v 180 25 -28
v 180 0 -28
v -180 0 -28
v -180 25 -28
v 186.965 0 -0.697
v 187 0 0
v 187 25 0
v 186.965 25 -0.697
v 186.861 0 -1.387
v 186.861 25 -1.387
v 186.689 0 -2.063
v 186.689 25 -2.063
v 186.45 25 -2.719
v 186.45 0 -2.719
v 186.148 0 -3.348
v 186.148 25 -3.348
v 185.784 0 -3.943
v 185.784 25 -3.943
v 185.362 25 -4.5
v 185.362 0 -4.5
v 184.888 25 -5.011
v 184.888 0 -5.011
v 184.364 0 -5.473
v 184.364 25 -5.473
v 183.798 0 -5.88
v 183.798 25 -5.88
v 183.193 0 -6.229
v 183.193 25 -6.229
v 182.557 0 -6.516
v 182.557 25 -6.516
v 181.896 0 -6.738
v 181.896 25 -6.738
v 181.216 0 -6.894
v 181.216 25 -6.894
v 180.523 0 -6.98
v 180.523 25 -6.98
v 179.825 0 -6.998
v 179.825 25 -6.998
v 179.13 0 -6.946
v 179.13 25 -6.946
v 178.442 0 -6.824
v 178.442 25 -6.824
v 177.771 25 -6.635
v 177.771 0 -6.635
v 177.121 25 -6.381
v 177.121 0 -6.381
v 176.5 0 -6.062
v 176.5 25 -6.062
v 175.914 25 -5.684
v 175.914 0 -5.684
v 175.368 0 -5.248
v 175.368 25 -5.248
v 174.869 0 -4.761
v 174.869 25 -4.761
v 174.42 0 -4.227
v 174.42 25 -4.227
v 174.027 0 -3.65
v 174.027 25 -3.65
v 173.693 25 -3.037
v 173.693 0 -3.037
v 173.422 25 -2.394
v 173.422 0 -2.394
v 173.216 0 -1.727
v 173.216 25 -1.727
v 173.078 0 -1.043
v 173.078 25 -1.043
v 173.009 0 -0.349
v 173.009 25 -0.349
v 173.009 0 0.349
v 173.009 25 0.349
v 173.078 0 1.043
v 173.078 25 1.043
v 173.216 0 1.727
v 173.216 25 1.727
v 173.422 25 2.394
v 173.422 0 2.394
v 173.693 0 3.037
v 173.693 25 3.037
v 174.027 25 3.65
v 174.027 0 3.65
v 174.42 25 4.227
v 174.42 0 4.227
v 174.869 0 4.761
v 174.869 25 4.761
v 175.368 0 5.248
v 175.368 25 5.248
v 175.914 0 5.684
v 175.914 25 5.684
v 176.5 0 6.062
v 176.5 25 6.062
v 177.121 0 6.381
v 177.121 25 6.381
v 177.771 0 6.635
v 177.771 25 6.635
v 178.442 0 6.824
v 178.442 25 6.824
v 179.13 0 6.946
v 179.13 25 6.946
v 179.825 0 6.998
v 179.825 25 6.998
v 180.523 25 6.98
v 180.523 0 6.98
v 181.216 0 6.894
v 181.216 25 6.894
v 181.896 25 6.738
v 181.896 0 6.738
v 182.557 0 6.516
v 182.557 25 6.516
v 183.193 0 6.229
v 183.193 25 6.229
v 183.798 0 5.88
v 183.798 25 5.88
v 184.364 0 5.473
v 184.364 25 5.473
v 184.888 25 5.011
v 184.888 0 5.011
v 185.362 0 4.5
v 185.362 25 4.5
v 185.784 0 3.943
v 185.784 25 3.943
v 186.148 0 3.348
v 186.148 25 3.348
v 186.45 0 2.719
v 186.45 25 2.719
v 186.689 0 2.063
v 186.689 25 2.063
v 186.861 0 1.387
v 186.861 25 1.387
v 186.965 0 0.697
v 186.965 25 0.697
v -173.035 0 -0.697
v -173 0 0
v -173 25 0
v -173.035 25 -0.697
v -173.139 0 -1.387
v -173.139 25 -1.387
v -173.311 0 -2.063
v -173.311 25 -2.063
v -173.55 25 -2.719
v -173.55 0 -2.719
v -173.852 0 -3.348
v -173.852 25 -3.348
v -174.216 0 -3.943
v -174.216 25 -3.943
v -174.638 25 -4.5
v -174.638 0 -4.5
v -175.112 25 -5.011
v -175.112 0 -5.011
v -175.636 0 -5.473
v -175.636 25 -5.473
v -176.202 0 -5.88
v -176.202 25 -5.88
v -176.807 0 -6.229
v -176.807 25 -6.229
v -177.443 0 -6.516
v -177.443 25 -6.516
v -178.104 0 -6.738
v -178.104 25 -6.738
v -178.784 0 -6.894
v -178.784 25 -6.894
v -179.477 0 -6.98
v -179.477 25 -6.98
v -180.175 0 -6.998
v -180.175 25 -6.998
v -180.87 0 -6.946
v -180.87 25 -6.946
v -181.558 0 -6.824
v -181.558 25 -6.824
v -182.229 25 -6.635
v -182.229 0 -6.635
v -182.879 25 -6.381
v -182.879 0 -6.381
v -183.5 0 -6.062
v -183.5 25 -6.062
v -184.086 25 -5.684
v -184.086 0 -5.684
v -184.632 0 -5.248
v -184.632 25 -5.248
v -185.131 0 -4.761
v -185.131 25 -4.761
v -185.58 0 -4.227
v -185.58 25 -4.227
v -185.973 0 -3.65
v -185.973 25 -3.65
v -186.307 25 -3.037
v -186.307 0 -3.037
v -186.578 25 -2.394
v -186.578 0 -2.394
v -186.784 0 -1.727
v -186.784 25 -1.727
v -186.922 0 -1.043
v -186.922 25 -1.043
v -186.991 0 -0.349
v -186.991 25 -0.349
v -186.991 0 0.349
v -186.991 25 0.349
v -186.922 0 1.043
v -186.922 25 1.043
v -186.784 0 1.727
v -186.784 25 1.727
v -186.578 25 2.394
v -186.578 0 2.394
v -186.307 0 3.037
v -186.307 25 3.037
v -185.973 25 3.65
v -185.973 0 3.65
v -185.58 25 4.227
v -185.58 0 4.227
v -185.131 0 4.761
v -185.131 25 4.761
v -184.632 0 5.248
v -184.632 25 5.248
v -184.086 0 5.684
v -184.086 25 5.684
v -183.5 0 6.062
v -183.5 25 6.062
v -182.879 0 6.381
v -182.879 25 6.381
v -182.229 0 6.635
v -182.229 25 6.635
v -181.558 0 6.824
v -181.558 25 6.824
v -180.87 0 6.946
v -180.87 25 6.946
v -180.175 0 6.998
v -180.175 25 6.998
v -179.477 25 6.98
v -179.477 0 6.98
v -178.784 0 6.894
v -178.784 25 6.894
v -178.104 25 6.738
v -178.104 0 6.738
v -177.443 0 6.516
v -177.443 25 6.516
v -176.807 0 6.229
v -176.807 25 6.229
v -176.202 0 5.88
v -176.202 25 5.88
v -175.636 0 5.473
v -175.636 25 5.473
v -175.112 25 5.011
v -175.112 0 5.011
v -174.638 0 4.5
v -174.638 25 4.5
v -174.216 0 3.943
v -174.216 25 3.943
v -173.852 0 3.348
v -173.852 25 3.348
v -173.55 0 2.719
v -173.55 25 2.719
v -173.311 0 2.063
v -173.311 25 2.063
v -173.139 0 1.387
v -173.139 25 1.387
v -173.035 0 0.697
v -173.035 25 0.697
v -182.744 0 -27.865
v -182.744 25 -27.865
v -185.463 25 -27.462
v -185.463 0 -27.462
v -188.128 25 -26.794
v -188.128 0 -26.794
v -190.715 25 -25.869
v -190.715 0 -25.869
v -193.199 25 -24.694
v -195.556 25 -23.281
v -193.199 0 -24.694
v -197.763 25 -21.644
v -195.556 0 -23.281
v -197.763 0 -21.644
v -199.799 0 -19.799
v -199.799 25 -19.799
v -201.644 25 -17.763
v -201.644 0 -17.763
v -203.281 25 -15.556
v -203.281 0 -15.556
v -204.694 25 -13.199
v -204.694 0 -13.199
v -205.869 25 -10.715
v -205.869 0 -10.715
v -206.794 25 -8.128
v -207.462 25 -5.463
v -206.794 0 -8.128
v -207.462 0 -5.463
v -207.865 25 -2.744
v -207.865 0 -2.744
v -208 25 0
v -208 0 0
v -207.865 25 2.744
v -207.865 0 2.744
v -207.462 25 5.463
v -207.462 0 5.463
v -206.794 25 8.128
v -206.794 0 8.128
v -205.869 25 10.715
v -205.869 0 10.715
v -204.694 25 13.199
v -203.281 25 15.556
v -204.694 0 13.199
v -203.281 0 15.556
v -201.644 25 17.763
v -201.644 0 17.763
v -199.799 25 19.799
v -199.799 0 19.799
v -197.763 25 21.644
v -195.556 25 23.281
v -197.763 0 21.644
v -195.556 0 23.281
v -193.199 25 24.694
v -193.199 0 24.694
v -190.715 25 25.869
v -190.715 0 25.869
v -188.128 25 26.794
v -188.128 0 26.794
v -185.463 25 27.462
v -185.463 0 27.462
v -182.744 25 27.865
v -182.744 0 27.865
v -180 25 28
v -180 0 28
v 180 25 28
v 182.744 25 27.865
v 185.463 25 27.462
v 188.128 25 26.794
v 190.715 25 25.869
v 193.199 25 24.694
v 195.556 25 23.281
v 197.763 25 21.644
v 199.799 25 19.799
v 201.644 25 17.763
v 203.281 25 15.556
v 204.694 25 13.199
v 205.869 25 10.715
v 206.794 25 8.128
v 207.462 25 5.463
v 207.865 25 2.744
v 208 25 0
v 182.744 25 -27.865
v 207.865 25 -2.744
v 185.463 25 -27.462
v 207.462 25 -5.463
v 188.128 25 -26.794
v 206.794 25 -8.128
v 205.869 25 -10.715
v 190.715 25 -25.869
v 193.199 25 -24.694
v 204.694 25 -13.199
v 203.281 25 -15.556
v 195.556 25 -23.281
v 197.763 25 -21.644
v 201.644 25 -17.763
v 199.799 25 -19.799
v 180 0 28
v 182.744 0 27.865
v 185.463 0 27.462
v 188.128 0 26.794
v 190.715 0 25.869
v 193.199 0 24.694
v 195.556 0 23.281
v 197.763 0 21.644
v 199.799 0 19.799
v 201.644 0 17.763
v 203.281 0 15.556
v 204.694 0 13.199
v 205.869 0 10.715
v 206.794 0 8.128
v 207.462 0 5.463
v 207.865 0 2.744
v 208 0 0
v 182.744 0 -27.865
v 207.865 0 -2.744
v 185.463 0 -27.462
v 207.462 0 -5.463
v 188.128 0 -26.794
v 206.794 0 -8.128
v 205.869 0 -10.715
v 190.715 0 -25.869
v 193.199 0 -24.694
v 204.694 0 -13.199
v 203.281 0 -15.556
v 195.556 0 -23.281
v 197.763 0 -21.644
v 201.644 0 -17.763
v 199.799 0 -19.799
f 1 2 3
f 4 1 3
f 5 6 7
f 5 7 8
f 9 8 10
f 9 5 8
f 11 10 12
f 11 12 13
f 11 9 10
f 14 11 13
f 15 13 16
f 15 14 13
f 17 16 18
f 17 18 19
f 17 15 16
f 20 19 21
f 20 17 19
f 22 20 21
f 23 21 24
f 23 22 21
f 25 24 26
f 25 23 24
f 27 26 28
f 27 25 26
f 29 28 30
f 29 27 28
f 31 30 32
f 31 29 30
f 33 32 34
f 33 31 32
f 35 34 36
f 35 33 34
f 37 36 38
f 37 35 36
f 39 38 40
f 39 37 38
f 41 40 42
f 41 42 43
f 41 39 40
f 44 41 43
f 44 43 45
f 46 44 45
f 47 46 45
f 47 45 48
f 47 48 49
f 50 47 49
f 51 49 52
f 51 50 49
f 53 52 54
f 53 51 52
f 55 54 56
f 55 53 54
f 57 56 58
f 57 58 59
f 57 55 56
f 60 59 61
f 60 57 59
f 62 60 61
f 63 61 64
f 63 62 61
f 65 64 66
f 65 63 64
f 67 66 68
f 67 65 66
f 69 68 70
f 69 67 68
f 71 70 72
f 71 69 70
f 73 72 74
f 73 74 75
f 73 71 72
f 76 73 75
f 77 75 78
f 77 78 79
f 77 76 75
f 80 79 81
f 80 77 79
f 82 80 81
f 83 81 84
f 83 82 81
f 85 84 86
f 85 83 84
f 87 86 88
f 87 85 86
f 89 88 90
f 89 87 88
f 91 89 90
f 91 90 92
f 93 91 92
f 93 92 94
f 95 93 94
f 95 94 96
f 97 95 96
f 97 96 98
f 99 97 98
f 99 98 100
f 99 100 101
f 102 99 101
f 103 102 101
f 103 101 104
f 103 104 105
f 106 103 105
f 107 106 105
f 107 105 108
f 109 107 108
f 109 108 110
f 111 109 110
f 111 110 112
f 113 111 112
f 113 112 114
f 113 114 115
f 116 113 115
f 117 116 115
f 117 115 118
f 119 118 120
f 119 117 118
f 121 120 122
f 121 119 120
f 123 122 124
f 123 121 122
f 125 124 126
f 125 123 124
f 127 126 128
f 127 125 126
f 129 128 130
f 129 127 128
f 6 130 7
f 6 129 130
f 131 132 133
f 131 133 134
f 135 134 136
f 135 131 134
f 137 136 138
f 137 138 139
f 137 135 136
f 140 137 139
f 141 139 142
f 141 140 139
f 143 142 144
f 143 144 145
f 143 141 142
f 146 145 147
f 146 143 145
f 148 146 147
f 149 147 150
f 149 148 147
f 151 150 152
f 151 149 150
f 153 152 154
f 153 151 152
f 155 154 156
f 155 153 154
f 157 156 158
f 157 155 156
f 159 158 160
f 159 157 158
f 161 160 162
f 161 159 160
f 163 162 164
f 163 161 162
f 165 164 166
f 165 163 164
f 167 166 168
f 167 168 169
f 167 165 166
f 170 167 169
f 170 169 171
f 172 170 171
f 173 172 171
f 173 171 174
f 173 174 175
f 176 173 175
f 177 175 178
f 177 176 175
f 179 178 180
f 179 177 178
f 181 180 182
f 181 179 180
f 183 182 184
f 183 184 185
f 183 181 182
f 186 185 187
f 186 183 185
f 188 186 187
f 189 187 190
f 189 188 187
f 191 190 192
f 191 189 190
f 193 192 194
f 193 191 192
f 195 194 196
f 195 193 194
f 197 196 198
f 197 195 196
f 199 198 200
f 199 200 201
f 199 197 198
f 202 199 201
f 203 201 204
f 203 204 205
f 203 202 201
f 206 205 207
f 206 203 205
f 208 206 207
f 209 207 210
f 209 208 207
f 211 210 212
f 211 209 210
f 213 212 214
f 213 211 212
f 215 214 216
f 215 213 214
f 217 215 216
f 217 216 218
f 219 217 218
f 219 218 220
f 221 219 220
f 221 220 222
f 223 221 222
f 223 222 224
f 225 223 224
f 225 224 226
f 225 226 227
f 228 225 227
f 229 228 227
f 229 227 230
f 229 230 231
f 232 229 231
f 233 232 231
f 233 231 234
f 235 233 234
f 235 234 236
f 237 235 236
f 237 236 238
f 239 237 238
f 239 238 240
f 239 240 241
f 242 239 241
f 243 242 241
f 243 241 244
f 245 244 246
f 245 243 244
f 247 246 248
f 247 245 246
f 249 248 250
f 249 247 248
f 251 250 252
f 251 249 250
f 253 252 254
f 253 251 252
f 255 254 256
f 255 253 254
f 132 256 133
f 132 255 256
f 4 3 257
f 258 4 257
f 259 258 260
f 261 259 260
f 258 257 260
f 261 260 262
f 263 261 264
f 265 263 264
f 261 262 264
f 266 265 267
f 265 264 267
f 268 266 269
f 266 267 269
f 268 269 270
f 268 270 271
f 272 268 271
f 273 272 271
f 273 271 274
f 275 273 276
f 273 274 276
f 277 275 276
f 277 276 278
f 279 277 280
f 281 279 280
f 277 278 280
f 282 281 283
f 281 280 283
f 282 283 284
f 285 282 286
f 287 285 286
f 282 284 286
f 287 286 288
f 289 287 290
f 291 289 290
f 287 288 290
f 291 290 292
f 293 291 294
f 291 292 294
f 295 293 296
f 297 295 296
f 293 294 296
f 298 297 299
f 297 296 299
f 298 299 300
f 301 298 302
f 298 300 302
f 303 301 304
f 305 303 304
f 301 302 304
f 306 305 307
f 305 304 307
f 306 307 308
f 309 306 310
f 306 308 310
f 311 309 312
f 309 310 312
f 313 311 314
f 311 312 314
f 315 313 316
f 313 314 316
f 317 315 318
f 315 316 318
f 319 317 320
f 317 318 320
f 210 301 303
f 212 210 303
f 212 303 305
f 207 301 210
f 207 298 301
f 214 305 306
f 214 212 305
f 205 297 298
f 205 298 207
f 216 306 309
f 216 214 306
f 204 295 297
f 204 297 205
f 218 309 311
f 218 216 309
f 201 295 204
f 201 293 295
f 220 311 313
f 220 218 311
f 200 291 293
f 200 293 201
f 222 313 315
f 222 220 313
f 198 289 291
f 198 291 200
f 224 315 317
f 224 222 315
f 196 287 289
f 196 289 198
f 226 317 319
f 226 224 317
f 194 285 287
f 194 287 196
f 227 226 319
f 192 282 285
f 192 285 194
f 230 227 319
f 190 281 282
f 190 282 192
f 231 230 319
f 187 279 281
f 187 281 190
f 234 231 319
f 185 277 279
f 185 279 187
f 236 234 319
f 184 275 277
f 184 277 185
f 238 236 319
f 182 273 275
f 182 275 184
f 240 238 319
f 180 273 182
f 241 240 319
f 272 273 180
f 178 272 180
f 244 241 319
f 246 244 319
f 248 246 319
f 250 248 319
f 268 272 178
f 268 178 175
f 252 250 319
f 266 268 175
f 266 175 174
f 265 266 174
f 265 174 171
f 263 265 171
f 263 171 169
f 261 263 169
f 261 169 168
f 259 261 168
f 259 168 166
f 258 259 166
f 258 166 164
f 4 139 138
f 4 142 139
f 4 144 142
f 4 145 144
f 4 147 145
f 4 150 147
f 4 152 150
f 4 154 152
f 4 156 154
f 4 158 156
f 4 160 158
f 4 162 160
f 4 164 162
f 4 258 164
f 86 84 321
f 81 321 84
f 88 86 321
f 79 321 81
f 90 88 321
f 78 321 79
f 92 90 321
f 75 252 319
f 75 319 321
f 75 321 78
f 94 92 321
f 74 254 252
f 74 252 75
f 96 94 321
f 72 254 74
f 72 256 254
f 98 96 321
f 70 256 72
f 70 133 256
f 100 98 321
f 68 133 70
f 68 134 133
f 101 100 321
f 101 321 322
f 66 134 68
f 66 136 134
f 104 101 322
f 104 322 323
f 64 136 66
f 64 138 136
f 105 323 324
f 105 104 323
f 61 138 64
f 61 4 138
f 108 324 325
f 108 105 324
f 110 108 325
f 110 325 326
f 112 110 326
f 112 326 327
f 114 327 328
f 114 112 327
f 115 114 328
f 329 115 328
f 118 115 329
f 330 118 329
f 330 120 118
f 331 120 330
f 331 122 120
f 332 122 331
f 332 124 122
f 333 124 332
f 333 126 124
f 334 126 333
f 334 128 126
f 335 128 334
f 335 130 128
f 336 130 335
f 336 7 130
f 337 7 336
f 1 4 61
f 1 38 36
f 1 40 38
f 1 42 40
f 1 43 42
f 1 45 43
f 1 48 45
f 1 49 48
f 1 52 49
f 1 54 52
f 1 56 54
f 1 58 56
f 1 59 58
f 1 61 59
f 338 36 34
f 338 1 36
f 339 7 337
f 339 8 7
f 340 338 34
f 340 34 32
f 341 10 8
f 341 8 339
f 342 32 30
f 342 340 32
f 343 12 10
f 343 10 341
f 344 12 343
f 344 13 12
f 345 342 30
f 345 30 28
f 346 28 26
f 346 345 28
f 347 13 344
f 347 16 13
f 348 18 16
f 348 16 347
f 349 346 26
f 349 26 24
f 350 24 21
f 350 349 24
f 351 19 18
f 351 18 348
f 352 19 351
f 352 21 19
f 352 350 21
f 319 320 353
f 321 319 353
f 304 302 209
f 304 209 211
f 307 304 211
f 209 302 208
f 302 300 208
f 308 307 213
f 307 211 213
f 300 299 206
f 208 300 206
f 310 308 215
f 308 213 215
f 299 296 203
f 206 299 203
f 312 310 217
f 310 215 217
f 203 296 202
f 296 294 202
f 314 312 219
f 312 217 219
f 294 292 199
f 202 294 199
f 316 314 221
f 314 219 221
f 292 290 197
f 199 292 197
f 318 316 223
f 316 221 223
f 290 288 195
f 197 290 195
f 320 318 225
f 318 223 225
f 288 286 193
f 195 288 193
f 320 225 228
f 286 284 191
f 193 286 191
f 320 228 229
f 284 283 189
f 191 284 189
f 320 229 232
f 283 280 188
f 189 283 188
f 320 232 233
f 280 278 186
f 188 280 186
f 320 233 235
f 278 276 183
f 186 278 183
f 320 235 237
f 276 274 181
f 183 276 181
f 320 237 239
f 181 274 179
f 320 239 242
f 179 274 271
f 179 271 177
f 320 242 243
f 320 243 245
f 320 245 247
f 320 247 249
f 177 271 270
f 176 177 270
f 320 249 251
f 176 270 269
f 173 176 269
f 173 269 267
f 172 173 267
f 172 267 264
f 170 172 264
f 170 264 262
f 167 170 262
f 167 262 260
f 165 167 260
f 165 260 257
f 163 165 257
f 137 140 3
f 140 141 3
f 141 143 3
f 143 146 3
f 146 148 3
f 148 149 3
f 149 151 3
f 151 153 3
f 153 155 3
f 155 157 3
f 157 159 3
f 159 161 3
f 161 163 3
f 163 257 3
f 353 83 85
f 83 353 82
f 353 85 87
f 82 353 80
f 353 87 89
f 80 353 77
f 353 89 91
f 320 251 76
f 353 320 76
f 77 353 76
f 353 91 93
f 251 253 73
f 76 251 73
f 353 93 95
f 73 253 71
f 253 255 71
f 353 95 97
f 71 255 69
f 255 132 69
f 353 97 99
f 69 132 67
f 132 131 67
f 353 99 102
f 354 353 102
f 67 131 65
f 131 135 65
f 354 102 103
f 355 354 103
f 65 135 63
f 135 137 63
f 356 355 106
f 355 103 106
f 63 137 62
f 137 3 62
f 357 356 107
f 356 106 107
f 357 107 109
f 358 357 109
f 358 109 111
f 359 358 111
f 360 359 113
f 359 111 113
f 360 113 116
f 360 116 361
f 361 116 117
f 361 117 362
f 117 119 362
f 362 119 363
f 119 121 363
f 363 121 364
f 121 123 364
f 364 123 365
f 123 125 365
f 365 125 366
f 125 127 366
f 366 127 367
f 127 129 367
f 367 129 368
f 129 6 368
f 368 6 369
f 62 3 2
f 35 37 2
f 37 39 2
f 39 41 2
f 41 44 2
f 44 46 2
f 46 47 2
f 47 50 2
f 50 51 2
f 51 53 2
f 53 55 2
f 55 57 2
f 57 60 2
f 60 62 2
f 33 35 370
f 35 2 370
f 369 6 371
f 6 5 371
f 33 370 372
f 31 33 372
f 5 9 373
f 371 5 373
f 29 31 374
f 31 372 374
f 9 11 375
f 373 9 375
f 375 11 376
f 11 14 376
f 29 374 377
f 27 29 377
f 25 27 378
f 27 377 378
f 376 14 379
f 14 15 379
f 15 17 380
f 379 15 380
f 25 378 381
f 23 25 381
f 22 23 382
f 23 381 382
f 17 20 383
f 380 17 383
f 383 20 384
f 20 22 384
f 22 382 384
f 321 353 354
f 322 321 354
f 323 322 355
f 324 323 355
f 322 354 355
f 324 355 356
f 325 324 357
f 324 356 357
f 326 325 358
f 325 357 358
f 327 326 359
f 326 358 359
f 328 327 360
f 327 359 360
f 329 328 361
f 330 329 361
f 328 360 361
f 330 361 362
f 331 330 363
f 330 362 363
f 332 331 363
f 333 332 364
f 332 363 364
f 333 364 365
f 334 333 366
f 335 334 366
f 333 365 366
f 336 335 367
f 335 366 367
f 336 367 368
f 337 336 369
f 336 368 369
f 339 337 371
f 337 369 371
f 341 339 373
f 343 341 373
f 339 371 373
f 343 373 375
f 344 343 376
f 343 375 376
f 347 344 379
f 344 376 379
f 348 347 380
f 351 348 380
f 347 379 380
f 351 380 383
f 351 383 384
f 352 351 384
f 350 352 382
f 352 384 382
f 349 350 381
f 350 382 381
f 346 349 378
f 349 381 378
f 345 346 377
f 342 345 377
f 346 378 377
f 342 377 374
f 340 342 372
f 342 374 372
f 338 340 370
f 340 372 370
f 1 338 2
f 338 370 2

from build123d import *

# Parameters (mm, degrees)
SKETCH_1_R      = 28
SKETCH_1_R_2    = 7
EXTRUDE_1_DEPTH = 25


with BuildPart() as part:
    # 草图1 → 凸台-拉伸1 (new body)
    with BuildSketch(Plane(origin=(0, 0, 0), x_dir=(1, 0, 0), z_dir=(0, 1, 0))):
        with BuildLine():
            Line((180, 28), (-180, 28))
            ThreePointArc((-180, 28), (-160.201010127, 19.798989873), (-152, 0))
            ThreePointArc((-152, 0), (-160.201010127, -19.798989873), (-180, -28))
            Line((-180, -28), (180, -28))
            ThreePointArc((180, -28), (152, 0), (180, 28))
        make_face()
        with Locations((180, 0)):
            Circle(SKETCH_1_R)
        with Locations((180, 0)):
            Circle(SKETCH_1_R_2, mode=Mode.SUBTRACT)
        with Locations((-180, 0)):
            Circle(SKETCH_1_R)
        with Locations((-180, 0)):
            Circle(SKETCH_1_R_2, mode=Mode.SUBTRACT)
    extrude(amount=EXTRUDE_1_DEPTH)


solid = part.part
